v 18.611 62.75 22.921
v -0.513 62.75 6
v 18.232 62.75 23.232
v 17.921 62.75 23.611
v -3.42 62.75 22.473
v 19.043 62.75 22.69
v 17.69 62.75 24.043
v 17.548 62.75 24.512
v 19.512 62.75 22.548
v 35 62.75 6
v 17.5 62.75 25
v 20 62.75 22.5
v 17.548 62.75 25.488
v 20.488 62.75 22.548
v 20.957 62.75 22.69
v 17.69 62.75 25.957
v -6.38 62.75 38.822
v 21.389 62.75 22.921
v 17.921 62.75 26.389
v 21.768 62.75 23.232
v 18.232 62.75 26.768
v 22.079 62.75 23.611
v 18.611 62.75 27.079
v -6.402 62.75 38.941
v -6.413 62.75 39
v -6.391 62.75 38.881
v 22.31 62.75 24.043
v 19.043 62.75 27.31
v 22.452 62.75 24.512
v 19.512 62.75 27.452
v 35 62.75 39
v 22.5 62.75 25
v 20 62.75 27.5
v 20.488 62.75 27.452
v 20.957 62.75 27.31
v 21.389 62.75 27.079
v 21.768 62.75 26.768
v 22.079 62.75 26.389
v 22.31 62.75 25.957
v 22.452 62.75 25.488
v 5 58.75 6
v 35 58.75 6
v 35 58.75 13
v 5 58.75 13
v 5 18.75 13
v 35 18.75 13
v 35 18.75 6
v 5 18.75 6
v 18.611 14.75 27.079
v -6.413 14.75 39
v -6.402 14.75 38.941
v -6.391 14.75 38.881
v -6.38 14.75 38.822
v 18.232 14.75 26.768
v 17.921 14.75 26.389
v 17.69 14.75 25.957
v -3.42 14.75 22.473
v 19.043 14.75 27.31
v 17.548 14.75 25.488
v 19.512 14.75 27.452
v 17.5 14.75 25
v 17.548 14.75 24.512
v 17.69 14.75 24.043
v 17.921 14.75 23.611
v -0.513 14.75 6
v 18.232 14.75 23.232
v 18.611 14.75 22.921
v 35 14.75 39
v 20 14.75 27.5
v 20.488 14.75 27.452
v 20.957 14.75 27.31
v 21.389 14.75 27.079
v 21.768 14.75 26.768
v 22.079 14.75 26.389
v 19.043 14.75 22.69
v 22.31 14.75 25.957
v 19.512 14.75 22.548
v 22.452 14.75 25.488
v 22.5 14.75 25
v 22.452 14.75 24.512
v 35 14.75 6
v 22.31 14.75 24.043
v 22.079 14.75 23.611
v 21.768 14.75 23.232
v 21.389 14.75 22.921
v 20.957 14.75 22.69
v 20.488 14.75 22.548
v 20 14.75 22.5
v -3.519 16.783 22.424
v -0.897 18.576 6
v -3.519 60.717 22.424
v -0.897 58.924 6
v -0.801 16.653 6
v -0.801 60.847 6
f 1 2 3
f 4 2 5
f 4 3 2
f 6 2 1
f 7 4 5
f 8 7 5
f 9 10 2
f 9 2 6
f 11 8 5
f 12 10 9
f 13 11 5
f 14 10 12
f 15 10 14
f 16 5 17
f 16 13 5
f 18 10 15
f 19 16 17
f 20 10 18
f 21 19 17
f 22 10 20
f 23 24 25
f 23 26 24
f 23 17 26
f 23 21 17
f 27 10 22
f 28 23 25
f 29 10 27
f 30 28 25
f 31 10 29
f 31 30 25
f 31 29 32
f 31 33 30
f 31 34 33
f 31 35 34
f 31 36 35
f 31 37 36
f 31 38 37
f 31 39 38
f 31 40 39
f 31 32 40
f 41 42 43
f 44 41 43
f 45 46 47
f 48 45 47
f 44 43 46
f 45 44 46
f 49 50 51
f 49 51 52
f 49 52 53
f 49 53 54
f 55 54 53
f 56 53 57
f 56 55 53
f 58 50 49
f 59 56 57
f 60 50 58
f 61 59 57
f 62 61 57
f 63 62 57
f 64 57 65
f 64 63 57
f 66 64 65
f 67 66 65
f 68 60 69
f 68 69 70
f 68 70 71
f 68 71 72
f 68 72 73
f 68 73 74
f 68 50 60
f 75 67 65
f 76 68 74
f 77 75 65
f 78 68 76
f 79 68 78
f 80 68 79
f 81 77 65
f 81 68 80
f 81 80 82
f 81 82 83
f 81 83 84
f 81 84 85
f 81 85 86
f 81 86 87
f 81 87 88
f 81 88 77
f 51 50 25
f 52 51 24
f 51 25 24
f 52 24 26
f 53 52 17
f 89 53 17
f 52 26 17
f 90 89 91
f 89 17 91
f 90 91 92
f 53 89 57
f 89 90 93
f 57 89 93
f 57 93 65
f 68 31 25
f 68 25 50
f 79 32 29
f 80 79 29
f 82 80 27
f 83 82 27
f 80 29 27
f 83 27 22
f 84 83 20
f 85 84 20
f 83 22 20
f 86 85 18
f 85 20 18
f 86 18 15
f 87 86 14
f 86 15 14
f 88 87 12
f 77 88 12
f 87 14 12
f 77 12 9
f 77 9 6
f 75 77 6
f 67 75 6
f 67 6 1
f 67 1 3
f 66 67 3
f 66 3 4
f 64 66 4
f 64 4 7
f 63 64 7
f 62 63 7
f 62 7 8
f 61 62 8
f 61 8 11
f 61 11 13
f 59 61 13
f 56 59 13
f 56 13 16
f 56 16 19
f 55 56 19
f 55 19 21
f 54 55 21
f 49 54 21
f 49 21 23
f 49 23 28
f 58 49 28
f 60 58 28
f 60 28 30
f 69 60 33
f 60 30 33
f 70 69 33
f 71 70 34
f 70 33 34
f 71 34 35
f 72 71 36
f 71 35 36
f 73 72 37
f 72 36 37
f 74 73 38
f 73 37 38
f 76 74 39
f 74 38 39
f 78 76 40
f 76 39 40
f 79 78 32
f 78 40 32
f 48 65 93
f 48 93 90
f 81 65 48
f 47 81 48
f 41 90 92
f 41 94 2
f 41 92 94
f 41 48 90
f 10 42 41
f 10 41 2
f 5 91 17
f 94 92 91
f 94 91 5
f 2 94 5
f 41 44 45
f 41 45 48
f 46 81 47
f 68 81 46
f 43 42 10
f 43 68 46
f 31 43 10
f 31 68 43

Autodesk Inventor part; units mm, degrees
ref_plane "YZ Plane" through (0, 0, 0) normal (1, 0, 0) x (0, 1, 0)
ref_plane "XZ Plane" through (0, 0, 0) normal (0, 1, 0) x (-1, 0, 0)
ref_plane "XY Plane" through (0, 0, 0) normal (0, 0, 1) x (1, 0, 0)
sketch "Sketch1" plane through (0, 0, 0) normal (0, 0, 1) x (1, 0, 0)
  line L0 (0, 0) -> (70, 0)
  line L1 (70, 0) -> (70, 77.5)
  line L2 (70, 77.5) -> (0, 77.5)
  line L3 (0, 77.5) -> (0, 0)
  dimension "d0" = 70
  dimension "d1" = 77.5
extrude "Extrusion1" add sketch "Sketch1" along normal blind 70
sketch "Sketch3" plane through (0, 0, 70) normal (0, 0, 1) x (1, 0, 0)
  line L0 (0, 0) -> (70, 0) projected
  line L1 (70, 77.5) -> (0, 77.5) projected
  line L2 (70, 0) -> (35, 0)
  line L3 (35, 0) -> (35, 77.5)
  line L4 (35, 77.5) -> (70, 77.5)
  line L5 (70, 77.5) -> (70, 0)
extrude "Extrusion3" cut sketch "Sketch3" against normal through all
sketch "Sketch4" plane through (0, 77.5, 70) normal (0, 1, 0) x (1, 0, 0)
  line L0 (0, 70) -> (0, 0) projected
  line L1 (0, 0) -> (-12.5, 0)
  line L2 (35, 70) -> (0, 70) projected
  arc A0 (-12.5, 0) -> (0, 70) centre (-1137.8005, 237.0626) ccw
  line L3 (-12.5, -10) -> (35, -10) construction
  dimension "d9" = 1150
  dimension "d54" = 47.5
  dimension "d55" = 10
extrude "Extrusion4" add sketch "Sketch4" against normal blind 77.5
sketch "Sketch5" plane through (35, 0, 70) normal (1, 0, 0) x (0, 0, -1)
  line L0 (0, 77.5) -> (0, 86.25)
  line L1 (0, 0) -> (0, -8.75)
  line L2 (0, 0) -> (0, 77.5) projected
  line L3 (70, 77.5) -> (70, 0) projected
  arc A0 (0, 86.25) -> (70, 77.5) centre (177.5728, 1222.4577) ccw
  arc A1 (70, 0) -> (0, -8.75) centre (177.5728, -1144.9577) ccw
  line L4 (0, 77.5) -> (70, 77.5) projected
  line L5 (70, 0) -> (0, 0) projected
  line L6 (-10, 86.25) -> (-10, -8.75) construction
  point P0 (-10, 38.75)
  point P1 (0, 38.75)
  dimension "d14" = 1150
  dimension "d15" = 1150
  dimension "d52" = 10
  dimension "d53" = 95
extrude "Extrusion5" add sketch "Sketch5" against normal blind 55 contours L0 A0 L4 | L5 A1 L1
sketch "Sketch6" plane through (-20, 0, 0) normal (0, 1, 0) x (1, 0, 0)
  line L0 (20, 0) -> (0, 0) projected
  line L1 (0, -70) -> (0, 0) projected
  arc A0 (7.5, -70) -> (20, 0) centre (-1117.8005, 167.0626) ccw projected
  line L2 (7.5, -70) -> (0, -70) projected
extrude "Extrusion6" cut sketch "Sketch6" along normal through all both and the other way through all
fillet "Fillet3" radius 19.35 2 edges at (-5.7463, 81.368, 35.3063) (-5.7463, -3.868, 35.3063)
sketch "Sketch8" plane through (0, 0, 70) normal (0, 0, 1) x (1, 0, 0)
  line L0 (35, 86.25) -> (35, -8.75) projected
  line L1 (35, 77.5) -> (35, 0) projected
  circle A0 centre (35, 38.75) radius 35
  point P0 (0, 0)
  dimension "d23" = 70
extrude "Extrusion7" cut sketch "Sketch8" against normal blind 17.5
sketch "Sketch17" plane through (35, 0, 0) normal (1, 0, 0) x (0, 0, -1)
  line L0 (-5, 13.75) -> (-40, 13.75)
  line L1 (-40, 13.75) -> (-40, 63.75)
  line L2 (-40, 63.75) -> (-5, 63.75)
  line L3 (-5, 63.75) -> (-5, 13.75)
  line L4 (0, 77.5) -> (0, 0) projected
  line L5 (-70, 86.25) -> (-70, 73.75) projected
  arc A0 (-70, 86.25) -> (0, 77.5) centre (107.5728, 1222.4577) ccw projected
  line L6 (-70, 3.75) -> (-70, 73.75) projected
  line L7 (-70, 3.75) -> (-70, -8.75) projected
  arc A1 (0, 0) -> (-70, -8.75) centre (107.5728, -1144.9577) ccw projected
  point P0 (-5, 38.75)
  point P1 (0, 38.75)
  dimension "d62" = 35
  dimension "d63" = 50
  dimension "d77" = 5
extrude "Extrusion15" cut sketch "Sketch17" against normal through all
sketch "Sketch21" plane through (35, 13.75, 5) normal (1, 0, 0) x (0, 0, -1)
  line L0 (-8, 5) -> (0, 5)
  line L1 (0, 5) -> (0, 45)
  line L2 (0, 45) -> (-8, 45)
  line L3 (-8, 45) -> (-8, 5)
  line L4 (0, 0) -> (0, 50) projected
  point P0 (5, -13.75)
  point P1 (-35, 25)
  point P2 (0, 25)
  dimension "d78" = 40
  dimension "d79" = 8
extrude "Extrusion19" cut sketch "Sketch21" against normal blind 30
sketch "Sketch22" plane through (35, 63.75, 40) normal (0, 1, 0) x (1, 0, 0)
  line L0 (0, 35) -> (0, 0) projected
  circle A0 centre (-15, 15) radius 2.5
  line L1 (0, 35) -> (-35.1041, 35) projected
  point P0 (-35, 40)
  dimension "d82" = 5
  dimension "d90" = 20
  dimension "d91" = 15
extrude "Extrusion20" cut sketch "Sketch22" against normal through all
sketch "Sketch23" plane through (35, 13.75, 40) normal (1, 0, 0) x (0, 0, -1)
  line L0 (35, 5) -> (27, 5) construction
  line L1 (27, 5) -> (27, 45) construction
  line L2 (27, 45) -> (35, 45) construction
  line L3 (35, 45) -> (35, 50) construction
  line L4 (35, 50) -> (0, 50) construction
  line L5 (0, 50) -> (0, 0) construction
  line L6 (0, 0) -> (35, 0) construction
  line L7 (35, 0) -> (35, 5) construction
  line L8 (35, 50) -> (0, 50) projected
  line L9 (0, 50) -> (35, 50)
  line L10 (35, 50) -> (35, 0)
  line L11 (35, 0) -> (0, 0)
  line L12 (0, 0) -> (0, 50)
  line L13 (34, 1) -> (34, 49)
  line L14 (34, 49) -> (1, 49)
  line L15 (1, 49) -> (1, 1)
  line L16 (1, 1) -> (34, 1)
  point P0 (40, -13.75)
  dimension "d86" = 1
extrude "Extrusion21" cut sketch "Sketch23" against normal through all
properties part number "AA016" material "ABS Plastic"
